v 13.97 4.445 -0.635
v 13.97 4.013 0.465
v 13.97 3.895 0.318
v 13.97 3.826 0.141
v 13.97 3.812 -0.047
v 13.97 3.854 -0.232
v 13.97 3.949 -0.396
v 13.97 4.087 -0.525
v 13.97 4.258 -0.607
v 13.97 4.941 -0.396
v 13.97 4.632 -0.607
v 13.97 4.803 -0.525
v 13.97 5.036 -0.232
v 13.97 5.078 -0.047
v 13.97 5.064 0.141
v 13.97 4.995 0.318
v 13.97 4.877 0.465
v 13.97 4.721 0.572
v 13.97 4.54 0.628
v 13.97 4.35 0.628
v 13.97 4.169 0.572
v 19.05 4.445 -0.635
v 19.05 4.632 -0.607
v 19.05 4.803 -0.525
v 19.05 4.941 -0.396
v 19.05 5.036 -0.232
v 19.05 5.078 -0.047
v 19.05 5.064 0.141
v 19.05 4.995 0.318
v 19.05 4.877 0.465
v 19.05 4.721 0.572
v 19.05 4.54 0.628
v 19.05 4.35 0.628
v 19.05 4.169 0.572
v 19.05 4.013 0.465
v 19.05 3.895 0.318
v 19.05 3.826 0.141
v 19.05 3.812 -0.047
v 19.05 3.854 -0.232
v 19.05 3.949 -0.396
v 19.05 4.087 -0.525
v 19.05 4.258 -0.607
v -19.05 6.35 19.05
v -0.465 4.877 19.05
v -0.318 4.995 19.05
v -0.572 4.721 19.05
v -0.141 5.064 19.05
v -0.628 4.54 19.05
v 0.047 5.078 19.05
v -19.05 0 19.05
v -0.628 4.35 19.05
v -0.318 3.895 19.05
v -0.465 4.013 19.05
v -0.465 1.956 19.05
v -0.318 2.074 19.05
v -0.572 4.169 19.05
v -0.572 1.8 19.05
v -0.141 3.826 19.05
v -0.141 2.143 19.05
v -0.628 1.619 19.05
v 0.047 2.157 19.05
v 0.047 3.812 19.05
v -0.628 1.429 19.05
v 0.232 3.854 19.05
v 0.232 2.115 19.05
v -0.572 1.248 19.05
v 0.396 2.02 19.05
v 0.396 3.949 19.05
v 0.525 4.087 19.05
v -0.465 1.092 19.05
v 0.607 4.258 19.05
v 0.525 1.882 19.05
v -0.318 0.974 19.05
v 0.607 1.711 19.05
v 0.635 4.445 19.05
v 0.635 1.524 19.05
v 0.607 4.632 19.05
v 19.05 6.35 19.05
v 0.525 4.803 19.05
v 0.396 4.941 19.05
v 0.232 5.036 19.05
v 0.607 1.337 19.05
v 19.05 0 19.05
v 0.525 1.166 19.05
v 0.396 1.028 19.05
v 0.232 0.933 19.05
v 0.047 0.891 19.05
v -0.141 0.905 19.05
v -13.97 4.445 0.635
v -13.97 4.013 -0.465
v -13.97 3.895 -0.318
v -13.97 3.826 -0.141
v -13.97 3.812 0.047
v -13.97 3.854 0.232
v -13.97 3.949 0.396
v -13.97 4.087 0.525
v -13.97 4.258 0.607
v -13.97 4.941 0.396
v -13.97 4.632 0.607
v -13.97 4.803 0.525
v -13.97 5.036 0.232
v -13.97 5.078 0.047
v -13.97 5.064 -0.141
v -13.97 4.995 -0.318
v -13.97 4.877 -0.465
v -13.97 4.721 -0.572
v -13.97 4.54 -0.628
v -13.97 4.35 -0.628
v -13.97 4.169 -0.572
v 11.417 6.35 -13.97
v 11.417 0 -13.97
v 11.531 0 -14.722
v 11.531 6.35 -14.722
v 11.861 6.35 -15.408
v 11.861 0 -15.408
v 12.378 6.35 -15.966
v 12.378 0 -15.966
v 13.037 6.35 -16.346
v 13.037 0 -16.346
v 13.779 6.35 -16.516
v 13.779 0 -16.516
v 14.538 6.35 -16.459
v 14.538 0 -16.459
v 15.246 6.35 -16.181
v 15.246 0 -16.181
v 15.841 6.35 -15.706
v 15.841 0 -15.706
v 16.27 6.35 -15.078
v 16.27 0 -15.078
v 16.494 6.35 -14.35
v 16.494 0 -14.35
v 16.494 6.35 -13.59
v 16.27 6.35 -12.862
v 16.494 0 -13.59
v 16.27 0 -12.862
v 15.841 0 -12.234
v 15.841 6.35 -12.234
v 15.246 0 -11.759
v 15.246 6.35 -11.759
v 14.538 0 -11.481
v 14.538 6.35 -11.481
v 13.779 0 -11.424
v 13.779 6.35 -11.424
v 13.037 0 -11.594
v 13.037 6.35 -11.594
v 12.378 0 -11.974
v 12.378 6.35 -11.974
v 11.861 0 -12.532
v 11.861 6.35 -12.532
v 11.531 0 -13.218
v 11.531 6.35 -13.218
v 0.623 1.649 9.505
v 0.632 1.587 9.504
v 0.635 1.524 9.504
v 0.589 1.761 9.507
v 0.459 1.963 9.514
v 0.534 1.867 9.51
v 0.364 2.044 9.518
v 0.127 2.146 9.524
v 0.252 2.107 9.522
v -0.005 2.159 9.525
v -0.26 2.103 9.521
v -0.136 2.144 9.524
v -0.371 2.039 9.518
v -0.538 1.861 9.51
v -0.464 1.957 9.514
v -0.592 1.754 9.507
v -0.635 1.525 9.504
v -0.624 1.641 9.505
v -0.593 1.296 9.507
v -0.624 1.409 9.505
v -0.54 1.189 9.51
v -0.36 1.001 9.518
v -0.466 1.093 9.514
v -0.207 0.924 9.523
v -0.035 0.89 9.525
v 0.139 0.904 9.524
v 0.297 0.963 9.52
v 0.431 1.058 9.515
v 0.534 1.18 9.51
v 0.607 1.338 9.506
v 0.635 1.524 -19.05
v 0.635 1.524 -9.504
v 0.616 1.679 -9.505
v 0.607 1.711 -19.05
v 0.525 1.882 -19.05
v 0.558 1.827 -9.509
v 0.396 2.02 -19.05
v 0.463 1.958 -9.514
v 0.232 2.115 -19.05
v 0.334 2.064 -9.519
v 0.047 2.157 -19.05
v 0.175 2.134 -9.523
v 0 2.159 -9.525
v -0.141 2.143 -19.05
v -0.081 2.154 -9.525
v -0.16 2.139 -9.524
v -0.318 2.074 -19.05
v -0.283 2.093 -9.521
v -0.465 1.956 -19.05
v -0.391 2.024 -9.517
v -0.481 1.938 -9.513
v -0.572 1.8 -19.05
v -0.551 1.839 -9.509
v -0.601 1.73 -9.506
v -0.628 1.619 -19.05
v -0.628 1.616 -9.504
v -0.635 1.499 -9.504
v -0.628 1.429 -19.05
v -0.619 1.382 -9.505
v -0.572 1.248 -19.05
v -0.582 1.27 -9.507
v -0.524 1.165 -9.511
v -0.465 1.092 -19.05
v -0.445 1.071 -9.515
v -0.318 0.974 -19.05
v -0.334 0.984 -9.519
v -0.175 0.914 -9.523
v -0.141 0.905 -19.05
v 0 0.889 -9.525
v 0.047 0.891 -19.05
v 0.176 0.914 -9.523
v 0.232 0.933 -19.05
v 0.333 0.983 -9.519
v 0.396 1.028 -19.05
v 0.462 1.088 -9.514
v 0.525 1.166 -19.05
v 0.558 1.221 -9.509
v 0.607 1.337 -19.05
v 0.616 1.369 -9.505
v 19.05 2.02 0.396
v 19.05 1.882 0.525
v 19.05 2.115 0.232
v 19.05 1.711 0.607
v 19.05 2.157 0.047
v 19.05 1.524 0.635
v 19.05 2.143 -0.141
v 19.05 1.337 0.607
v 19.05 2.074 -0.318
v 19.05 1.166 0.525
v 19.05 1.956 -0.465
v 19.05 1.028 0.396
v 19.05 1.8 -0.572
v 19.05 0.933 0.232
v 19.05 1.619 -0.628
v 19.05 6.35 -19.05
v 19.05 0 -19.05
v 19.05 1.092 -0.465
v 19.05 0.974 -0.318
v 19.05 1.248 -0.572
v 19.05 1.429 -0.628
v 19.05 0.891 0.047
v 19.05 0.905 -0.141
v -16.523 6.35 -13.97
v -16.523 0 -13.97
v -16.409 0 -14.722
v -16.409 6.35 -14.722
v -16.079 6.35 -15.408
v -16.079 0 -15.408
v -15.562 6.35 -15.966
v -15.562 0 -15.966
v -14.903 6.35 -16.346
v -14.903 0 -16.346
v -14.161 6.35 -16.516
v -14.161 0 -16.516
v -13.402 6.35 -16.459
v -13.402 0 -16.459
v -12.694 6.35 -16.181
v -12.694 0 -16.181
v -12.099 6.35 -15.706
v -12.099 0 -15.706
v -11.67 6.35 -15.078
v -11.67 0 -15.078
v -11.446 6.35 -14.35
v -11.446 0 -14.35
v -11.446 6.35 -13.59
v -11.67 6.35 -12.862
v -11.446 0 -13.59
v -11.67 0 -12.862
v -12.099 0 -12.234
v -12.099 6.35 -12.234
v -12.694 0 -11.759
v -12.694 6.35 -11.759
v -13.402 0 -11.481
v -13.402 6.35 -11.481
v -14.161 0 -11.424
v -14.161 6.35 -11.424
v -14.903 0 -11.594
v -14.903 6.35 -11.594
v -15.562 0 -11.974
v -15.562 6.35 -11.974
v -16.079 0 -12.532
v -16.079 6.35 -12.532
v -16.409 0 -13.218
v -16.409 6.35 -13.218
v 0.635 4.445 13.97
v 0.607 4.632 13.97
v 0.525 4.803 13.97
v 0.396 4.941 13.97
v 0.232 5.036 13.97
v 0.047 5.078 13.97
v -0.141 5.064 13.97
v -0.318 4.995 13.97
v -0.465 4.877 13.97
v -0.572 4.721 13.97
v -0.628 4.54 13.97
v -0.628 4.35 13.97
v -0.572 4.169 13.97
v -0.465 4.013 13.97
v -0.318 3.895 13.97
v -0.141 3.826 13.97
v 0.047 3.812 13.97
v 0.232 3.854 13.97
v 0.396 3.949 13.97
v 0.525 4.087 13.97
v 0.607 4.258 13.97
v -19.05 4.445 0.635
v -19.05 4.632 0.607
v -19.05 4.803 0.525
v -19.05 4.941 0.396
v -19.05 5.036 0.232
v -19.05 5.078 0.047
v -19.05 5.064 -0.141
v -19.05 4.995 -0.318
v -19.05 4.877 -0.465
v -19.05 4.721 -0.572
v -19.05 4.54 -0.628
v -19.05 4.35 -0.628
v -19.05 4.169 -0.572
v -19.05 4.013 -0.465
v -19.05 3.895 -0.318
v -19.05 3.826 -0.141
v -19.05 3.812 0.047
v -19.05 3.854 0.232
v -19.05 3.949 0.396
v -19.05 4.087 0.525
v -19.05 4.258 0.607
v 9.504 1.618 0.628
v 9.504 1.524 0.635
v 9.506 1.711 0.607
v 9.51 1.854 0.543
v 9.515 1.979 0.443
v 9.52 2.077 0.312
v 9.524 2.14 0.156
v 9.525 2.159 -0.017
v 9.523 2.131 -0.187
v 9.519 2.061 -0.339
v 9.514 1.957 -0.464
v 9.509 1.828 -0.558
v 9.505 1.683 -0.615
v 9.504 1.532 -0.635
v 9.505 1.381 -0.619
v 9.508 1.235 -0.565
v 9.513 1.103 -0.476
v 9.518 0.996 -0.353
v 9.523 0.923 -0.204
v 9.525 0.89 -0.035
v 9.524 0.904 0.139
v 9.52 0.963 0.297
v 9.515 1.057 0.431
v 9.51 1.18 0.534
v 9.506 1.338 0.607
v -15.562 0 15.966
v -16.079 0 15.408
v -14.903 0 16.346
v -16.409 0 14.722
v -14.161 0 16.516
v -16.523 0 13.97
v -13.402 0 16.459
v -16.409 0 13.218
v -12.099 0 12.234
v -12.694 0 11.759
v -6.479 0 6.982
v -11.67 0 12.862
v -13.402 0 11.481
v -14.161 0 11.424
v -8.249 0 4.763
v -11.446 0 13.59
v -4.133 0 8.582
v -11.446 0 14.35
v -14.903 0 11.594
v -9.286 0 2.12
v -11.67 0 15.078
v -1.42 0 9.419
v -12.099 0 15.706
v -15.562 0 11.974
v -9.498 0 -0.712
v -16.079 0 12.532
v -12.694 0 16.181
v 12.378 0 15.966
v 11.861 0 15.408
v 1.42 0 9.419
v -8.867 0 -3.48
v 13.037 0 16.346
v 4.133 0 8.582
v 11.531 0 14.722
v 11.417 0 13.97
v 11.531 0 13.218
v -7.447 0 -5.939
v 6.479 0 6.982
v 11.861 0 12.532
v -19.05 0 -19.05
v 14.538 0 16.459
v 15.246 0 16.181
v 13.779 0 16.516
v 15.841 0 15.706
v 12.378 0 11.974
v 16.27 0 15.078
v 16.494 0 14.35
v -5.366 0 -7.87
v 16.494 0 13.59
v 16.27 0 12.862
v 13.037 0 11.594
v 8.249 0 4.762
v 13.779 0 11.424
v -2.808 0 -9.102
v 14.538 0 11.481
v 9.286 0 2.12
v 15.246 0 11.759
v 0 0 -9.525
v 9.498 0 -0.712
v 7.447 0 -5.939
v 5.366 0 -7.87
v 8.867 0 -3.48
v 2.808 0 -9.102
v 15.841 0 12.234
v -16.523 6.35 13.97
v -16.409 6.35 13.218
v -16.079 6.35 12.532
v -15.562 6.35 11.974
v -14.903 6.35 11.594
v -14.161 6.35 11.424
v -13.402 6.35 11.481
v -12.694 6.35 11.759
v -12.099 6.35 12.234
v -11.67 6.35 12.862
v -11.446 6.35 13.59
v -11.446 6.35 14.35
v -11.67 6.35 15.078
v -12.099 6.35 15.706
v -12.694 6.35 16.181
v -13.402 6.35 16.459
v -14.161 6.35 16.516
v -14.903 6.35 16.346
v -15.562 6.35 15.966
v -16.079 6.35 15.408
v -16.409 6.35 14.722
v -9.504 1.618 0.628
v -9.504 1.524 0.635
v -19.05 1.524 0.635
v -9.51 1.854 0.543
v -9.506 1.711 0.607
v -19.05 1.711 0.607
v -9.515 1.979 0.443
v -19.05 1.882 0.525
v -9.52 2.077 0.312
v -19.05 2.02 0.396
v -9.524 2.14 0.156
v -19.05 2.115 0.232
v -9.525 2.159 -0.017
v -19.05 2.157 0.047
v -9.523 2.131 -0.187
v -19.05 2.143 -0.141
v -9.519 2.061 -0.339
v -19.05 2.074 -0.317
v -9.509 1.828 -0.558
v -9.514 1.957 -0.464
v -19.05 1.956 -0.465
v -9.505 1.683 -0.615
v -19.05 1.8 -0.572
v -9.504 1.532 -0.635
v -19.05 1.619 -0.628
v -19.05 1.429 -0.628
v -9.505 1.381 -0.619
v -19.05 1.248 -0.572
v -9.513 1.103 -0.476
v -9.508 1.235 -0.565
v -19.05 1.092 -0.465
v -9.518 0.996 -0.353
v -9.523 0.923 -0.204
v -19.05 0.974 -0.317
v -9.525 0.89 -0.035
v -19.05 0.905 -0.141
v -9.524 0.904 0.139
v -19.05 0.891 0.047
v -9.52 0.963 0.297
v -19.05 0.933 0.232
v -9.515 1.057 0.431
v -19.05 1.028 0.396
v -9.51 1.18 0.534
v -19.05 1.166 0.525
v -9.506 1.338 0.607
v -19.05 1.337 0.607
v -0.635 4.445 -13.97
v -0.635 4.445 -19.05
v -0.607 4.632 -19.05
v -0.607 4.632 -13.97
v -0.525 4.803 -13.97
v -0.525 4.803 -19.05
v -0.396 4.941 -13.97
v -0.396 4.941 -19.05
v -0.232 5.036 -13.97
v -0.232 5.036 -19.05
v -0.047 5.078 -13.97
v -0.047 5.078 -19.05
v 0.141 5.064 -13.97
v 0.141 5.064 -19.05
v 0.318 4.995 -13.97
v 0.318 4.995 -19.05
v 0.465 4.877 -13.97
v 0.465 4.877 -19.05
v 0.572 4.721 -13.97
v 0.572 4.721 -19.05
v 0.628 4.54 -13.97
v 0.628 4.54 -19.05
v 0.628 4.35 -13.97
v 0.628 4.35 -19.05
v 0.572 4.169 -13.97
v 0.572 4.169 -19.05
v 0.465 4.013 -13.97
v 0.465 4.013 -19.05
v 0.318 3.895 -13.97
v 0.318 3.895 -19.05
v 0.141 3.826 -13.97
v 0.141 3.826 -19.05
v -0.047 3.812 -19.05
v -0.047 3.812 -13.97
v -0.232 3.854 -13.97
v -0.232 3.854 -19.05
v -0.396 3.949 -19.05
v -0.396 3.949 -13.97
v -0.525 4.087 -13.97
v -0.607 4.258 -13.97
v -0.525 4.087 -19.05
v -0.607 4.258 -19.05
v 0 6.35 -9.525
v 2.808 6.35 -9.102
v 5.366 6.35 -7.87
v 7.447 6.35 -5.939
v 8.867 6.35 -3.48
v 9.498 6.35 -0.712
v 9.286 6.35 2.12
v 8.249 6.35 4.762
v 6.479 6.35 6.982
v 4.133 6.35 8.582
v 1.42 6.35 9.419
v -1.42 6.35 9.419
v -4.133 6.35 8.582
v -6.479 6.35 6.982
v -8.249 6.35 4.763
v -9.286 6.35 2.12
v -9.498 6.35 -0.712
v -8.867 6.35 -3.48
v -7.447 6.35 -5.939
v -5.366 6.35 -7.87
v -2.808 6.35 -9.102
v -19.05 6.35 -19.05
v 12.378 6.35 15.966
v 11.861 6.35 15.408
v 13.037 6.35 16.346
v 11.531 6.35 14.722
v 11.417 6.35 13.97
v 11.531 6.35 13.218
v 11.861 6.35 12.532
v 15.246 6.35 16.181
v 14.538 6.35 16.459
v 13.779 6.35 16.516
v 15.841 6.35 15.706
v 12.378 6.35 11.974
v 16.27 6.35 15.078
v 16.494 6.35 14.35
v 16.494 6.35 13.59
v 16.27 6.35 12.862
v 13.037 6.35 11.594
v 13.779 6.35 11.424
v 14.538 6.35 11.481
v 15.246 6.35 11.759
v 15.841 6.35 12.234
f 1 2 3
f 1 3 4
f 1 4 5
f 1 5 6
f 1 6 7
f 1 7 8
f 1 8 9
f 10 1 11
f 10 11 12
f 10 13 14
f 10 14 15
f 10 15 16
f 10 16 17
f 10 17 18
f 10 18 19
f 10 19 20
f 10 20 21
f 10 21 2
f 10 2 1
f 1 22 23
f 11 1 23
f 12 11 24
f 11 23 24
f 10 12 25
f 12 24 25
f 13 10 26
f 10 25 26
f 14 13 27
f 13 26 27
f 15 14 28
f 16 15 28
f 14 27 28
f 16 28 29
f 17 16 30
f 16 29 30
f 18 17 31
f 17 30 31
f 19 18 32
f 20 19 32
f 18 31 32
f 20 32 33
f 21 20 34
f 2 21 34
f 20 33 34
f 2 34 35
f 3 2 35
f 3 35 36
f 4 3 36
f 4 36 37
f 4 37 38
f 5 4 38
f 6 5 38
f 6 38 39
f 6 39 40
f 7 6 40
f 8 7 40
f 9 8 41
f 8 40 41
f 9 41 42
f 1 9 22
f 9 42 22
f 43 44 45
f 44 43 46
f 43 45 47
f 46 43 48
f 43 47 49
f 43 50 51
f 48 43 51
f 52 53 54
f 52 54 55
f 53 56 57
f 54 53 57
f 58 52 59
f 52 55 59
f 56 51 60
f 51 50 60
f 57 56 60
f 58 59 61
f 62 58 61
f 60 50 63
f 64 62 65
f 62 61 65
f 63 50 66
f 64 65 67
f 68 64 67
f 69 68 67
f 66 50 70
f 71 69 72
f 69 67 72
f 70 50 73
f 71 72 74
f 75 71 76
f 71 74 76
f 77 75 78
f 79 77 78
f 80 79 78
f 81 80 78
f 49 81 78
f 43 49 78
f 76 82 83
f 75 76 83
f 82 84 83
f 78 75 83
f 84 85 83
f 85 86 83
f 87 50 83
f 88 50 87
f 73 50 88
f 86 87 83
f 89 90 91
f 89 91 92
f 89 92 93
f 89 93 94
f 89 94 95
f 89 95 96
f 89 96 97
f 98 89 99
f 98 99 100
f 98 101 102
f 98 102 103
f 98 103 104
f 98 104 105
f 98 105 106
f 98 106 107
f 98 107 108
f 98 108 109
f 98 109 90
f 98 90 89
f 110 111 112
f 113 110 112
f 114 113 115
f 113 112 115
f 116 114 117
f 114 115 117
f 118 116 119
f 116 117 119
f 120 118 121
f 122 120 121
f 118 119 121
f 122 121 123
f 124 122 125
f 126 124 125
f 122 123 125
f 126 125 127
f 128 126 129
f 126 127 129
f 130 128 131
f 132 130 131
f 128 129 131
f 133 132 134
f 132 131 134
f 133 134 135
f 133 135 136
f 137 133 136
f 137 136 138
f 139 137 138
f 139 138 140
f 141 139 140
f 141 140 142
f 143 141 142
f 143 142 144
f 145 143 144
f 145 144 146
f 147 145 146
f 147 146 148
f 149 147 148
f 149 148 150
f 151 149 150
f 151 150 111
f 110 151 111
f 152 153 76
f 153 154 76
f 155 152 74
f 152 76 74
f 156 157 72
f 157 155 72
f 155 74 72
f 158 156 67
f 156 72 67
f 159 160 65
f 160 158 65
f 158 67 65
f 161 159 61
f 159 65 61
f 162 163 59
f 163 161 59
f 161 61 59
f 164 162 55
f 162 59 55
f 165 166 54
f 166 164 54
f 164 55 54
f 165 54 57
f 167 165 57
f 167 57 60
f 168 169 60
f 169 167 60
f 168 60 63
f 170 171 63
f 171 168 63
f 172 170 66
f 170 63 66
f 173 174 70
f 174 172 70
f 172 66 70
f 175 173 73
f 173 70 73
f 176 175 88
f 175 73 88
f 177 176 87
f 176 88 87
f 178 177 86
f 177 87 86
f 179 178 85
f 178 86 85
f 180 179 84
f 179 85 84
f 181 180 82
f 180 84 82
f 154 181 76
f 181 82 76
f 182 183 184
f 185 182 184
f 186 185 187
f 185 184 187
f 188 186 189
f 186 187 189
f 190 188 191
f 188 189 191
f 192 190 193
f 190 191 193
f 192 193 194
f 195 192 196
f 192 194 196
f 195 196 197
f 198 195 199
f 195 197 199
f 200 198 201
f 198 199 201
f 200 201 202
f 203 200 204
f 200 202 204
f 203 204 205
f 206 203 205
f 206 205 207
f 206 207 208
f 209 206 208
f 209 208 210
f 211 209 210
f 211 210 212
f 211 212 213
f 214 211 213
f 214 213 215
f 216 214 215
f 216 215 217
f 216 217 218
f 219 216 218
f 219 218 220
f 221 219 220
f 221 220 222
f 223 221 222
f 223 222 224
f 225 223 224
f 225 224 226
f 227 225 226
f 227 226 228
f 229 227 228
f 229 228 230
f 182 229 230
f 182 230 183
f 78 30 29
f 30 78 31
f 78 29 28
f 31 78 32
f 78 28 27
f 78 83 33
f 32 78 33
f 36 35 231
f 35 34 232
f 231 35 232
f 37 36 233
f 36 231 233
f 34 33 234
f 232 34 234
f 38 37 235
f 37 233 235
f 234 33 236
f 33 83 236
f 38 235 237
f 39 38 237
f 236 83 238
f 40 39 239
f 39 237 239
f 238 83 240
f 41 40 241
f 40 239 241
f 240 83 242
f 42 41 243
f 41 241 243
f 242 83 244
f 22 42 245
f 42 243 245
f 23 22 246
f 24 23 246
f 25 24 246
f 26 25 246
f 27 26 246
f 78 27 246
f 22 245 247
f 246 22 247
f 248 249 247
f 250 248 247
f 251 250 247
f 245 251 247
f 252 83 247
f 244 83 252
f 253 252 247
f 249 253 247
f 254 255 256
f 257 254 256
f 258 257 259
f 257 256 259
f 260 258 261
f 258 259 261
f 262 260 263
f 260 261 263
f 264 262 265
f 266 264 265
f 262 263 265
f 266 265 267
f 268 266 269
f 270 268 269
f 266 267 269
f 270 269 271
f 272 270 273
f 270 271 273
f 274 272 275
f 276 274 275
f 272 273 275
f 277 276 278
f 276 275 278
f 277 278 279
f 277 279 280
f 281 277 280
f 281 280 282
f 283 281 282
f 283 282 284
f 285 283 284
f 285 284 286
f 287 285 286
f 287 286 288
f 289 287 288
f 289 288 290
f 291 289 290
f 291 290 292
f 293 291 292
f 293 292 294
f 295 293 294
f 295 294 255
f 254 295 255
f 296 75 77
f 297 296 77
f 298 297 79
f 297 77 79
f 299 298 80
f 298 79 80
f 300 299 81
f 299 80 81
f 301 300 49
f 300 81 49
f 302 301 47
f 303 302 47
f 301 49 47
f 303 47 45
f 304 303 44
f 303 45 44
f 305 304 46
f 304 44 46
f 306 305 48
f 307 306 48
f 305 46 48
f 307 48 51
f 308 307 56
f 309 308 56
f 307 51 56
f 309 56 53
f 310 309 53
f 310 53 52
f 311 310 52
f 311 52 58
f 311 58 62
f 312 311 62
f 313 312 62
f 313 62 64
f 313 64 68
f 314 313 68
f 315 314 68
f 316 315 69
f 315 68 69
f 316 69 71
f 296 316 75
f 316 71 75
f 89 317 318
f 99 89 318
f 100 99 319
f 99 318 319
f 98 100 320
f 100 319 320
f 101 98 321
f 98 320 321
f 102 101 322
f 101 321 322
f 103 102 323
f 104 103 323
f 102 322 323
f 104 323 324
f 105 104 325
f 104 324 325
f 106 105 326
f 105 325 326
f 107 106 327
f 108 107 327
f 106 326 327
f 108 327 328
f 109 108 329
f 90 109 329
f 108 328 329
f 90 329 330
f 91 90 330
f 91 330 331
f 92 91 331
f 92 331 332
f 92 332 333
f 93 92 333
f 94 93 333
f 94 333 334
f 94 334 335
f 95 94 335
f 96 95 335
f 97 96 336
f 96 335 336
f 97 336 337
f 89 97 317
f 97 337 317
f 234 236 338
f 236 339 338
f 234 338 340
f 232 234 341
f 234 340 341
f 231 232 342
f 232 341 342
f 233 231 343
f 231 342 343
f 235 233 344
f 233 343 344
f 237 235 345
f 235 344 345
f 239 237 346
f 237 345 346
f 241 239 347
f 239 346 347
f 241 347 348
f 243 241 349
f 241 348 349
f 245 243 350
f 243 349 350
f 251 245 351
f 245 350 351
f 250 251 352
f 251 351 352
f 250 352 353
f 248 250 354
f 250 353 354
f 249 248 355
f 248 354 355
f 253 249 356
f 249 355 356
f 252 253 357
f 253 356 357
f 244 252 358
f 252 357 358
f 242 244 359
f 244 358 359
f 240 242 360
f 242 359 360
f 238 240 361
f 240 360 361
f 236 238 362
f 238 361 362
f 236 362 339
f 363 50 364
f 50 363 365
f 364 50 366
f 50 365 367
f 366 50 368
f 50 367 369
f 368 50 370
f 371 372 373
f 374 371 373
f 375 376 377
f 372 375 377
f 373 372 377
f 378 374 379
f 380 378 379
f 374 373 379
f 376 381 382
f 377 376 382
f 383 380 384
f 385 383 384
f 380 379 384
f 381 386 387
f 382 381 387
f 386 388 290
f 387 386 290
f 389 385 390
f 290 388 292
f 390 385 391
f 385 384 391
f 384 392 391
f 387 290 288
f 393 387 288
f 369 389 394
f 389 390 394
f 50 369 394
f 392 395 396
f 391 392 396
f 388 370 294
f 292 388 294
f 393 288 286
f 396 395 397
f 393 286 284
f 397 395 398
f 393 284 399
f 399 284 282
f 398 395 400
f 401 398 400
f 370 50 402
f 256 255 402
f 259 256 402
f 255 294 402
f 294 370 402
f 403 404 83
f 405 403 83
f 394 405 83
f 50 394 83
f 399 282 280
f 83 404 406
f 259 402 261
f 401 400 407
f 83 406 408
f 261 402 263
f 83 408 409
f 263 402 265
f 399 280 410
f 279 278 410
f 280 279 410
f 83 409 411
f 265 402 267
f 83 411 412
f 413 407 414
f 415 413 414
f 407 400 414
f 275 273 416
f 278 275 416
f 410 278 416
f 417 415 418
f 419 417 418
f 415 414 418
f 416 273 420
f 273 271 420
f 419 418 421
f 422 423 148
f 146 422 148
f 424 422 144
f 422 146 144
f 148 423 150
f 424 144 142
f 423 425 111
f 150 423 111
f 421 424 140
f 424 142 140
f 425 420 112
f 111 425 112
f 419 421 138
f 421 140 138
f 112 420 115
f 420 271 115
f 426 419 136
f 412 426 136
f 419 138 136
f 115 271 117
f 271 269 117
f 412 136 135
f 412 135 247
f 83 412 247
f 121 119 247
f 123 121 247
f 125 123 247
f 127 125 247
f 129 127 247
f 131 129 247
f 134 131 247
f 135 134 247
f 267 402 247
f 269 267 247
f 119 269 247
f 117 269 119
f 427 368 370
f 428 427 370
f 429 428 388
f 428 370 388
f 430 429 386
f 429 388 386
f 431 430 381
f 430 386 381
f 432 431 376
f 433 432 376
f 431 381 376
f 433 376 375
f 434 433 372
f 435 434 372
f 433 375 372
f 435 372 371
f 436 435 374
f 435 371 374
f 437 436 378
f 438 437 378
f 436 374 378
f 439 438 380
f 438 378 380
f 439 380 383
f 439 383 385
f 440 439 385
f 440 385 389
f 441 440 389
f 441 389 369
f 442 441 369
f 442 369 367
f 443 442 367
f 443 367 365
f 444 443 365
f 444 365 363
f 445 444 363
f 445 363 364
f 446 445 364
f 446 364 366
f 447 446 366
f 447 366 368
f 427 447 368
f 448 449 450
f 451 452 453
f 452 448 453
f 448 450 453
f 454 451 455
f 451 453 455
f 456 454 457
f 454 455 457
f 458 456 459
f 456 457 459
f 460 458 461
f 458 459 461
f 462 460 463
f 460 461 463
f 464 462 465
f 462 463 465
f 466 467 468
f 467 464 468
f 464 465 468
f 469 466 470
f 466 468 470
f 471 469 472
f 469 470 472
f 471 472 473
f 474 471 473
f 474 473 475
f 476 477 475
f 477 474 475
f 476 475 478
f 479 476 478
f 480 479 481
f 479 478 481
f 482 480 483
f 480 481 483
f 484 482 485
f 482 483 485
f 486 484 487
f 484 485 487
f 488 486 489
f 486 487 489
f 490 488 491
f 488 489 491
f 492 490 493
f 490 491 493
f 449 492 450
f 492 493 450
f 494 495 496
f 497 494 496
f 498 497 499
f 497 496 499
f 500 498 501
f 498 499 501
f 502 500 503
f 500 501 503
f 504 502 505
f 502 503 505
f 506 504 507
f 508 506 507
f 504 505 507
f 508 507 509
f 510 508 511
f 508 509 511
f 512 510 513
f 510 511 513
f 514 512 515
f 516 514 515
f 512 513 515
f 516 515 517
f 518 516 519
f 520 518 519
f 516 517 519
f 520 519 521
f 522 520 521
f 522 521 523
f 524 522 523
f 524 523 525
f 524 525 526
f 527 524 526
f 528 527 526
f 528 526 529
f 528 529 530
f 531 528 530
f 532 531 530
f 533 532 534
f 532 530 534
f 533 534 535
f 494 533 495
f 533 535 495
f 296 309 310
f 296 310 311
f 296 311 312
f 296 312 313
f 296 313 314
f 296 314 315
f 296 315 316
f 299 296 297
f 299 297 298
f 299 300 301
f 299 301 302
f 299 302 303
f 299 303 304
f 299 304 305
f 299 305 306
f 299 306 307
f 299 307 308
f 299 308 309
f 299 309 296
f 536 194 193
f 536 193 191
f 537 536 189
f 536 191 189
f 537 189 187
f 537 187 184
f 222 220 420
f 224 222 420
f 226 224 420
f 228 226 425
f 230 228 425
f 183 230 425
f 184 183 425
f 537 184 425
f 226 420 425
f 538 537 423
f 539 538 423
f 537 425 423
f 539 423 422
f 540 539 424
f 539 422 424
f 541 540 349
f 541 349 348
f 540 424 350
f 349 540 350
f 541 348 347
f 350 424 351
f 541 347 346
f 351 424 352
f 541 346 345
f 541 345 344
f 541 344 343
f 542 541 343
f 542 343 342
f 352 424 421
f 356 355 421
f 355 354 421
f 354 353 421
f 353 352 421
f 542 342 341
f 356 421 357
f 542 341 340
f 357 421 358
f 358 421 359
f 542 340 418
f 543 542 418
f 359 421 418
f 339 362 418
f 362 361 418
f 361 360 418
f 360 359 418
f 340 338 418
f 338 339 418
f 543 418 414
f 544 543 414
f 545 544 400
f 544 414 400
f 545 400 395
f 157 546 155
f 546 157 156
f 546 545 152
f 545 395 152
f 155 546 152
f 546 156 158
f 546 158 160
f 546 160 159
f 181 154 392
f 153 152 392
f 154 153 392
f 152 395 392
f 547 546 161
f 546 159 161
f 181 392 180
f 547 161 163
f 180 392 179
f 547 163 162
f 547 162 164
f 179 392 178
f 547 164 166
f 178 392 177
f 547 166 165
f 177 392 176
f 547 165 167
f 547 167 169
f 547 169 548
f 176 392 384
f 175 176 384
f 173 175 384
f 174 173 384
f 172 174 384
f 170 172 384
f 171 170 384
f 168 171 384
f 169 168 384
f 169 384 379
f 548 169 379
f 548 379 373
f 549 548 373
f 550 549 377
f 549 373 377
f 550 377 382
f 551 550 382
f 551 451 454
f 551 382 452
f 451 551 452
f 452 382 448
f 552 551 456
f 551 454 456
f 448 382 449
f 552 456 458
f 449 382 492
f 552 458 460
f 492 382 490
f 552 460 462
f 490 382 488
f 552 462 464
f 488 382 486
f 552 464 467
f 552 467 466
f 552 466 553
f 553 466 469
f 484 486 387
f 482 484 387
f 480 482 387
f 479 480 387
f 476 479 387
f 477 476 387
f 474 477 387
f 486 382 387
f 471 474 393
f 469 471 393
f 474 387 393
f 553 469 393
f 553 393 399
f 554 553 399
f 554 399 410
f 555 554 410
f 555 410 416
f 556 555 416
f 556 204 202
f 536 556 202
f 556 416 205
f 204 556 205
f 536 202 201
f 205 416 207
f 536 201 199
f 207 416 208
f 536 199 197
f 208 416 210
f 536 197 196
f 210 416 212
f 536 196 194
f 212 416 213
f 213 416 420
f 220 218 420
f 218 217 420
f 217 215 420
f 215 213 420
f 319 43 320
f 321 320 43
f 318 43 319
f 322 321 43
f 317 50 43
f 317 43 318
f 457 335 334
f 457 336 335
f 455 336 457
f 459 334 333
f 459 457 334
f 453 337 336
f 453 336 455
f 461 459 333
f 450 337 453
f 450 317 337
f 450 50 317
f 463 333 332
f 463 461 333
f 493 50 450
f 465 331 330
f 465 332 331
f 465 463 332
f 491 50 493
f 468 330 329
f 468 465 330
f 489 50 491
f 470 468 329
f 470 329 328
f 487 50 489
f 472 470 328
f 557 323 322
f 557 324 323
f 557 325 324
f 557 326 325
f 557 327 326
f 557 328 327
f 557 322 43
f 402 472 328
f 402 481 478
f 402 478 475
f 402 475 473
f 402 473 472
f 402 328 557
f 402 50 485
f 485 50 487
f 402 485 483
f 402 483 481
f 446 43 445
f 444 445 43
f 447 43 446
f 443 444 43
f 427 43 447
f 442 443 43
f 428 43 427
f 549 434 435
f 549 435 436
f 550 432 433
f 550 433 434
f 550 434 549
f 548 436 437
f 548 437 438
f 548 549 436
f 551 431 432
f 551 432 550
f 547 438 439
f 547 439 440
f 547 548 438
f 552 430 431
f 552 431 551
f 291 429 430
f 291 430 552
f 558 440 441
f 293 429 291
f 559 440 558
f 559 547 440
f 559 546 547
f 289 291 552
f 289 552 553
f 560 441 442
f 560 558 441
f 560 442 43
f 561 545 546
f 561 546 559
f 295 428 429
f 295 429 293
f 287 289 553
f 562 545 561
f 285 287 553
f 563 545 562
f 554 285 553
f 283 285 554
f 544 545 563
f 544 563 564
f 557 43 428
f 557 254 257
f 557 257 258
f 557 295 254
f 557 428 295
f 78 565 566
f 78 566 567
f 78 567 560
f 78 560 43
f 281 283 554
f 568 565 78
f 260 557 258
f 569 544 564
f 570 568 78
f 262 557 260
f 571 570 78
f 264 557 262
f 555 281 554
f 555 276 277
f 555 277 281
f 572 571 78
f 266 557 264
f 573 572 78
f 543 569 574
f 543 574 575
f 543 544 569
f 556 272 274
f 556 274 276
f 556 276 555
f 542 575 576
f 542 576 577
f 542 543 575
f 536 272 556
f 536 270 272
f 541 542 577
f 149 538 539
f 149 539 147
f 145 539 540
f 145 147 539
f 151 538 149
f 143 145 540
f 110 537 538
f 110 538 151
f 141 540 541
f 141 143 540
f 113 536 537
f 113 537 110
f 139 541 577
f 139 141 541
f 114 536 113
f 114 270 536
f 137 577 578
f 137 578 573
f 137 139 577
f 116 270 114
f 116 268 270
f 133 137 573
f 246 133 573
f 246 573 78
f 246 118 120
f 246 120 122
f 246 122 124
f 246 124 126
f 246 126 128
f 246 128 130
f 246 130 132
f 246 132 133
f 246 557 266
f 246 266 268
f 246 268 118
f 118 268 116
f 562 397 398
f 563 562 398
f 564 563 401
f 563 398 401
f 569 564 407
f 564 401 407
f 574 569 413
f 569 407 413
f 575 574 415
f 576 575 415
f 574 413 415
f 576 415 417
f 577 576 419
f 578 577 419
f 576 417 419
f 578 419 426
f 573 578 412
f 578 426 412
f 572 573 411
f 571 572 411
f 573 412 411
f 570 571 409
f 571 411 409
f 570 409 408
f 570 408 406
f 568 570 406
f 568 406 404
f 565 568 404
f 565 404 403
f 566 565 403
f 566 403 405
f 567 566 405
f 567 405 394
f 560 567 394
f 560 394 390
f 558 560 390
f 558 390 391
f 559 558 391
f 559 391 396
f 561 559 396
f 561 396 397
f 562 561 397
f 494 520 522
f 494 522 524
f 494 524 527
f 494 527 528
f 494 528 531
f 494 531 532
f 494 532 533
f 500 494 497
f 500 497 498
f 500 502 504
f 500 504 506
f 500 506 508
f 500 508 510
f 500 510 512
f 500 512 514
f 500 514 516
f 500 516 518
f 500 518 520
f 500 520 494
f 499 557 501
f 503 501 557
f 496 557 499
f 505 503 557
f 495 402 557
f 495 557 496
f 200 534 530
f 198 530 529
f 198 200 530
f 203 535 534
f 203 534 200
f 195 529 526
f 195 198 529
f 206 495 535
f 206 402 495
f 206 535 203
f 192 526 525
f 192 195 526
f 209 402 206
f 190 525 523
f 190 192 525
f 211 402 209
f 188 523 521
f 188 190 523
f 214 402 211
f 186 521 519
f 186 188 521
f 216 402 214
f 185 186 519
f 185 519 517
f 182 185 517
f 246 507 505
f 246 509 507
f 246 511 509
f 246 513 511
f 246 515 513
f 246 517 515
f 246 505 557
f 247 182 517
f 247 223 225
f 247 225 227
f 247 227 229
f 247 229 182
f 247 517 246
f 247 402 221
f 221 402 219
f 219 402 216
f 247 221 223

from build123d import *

# Parameters (mm, degrees)
SKETCH1_W                   = 38.1
SKETCH1_H                   = 38.1
BOSS_EXTRUDE1_DEPTH         = 6.35
SKETCH2_R                   = 9.525
CUT_EXTRUDE1_DEPTH          = 28.679008291
SKETCH3_R                   = 0.635
CUT_EXTRUDE2_DEPTH          = 44.067795393
CIRPATTERN1_COUNT           = 4
SKETCH4_R                   = 0.635
CUT_EXTRUDE3_DEPTH          = 5.08
CIRPATTERN2_COUNT           = 4
TAP_DRILL_FOR_1_4_20_TAP1_D = 5.1054


with BuildPart() as part:
    # Sketch1 → Boss-Extrude1 (new body)
    with BuildSketch(Plane(origin=(0, 0, 0), x_dir=(1, 0, 0), z_dir=(0, 1, 0))):
        Rectangle(SKETCH1_W, SKETCH1_H)
    extrude(amount=BOSS_EXTRUDE1_DEPTH)

    # Sketch2 → Cut-Extrude1 (cut, through all)
    with BuildSketch(Plane.XZ):
        with Locations(Location((0, 0, 0), (0, 0, 270))):
            Circle(SKETCH2_R)
    extrude(amount=-CUT_EXTRUDE1_DEPTH, mode=Mode.SUBTRACT)

    # Sketch3 → Cut-Extrude2 (cut, through all)
    with BuildSketch(Plane.XY.offset(19.05)):
        with Locations((0, 1.524)):
            Circle(SKETCH3_R)
    cut_extrude2 = extrude(amount=-CUT_EXTRUDE2_DEPTH, mode=Mode.SUBTRACT)

    # CirPattern1: Cut-Extrude2 ×4 about axis
    cirpattern1_axis = Axis((0, 6.35, 0), (0, -1, 0))
    for i in range(1, CIRPATTERN1_COUNT):
        add(cut_extrude2.rotate(cirpattern1_axis, i * 360 / CIRPATTERN1_COUNT), mode=Mode.SUBTRACT)

    # Sketch4 → Cut-Extrude3 (cut)
    with BuildSketch(Plane.XY.offset(19.05)):
        with Locations((0, 4.445)):
            Circle(SKETCH4_R)
    cut_extrude3 = extrude(amount=-CUT_EXTRUDE3_DEPTH, mode=Mode.SUBTRACT)

    # CirPattern2: Cut-Extrude3 ×4 about axis
    cirpattern2_axis = Axis((0, 0, 0), (0, 1, 0))
    for i in range(1, CIRPATTERN2_COUNT):
        add(cut_extrude3.rotate(cirpattern2_axis, i * 360 / CIRPATTERN2_COUNT), mode=Mode.SUBTRACT)

    # Tap Drill for 1/4-20 Tap1 (through all)
    with Locations(Plane(origin=(0, 6.35, 0), x_dir=(1, 0, 0), z_dir=(0, 1, 0))):
        with Locations((-13.97, 13.97), (13.97, 13.97), (-13.97, -13.97), (13.97, -13.97)):
            Hole(TAP_DRILL_FOR_1_4_20_TAP1_D / 2)


solid = part.part
